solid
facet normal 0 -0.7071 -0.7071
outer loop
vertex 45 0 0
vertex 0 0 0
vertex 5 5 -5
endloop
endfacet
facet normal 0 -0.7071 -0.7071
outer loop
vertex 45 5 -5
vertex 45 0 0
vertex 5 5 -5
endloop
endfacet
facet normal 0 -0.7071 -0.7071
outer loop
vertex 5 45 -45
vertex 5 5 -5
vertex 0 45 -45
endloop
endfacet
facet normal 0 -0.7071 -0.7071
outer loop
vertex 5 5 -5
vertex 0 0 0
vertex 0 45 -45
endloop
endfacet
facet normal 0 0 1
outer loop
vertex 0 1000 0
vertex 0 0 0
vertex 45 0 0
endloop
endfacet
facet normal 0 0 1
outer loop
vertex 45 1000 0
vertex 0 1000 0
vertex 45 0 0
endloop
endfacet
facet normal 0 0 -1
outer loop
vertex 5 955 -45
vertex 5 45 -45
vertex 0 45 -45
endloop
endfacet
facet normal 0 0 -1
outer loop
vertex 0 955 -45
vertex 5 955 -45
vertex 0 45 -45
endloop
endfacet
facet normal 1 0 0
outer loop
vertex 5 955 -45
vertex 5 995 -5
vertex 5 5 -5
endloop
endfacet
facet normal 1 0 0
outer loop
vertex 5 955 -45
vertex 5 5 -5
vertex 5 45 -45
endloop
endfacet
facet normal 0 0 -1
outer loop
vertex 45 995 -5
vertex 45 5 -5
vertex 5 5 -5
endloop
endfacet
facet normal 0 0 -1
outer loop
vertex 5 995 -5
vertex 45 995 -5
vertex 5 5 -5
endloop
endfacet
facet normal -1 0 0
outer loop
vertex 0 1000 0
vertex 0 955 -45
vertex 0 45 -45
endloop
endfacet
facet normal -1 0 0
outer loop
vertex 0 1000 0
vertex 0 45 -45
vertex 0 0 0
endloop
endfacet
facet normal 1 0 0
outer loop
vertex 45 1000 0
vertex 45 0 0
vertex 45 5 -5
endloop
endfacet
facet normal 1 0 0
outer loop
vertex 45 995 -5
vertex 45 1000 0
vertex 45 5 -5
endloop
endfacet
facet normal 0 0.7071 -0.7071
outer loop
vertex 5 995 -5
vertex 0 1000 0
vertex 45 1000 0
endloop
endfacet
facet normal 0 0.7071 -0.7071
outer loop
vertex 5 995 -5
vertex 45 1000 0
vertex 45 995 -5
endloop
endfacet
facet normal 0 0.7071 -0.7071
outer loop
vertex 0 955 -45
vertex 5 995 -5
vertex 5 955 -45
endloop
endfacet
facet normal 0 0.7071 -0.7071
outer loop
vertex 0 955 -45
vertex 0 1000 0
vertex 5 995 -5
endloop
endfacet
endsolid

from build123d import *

# Parameters (mm, degrees)
EXTRUDE_1_DEPTH     = 1000
CUT_EXTRUDE_1_DEPTH = 46


with BuildPart() as part:
    # Эскиз1 → Вытянуть-Тонкостенный1 (new body)
    with BuildSketch(Plane(origin=(0, 0, 0), x_dir=(1, 0, 0), z_dir=(0, 1, 0))):
        Polygon((0, 45), (0, 0), (45, 0), (45, 5), (5, 5), (5, 45), align=None)
    extrude(amount=EXTRUDE_1_DEPTH)

    # Эскиз2 → Вырез-Вытянуть1 (cut, through all)
    with BuildSketch(Plane.ZY):
        Polygon((0, 0), (-45, 45), (-45, 0), align=None)
        Polygon((-45, 1000), (0, 1000), (-45, 955), align=None)
    extrude(amount=-CUT_EXTRUDE_1_DEPTH, mode=Mode.SUBTRACT)


solid = part.part
